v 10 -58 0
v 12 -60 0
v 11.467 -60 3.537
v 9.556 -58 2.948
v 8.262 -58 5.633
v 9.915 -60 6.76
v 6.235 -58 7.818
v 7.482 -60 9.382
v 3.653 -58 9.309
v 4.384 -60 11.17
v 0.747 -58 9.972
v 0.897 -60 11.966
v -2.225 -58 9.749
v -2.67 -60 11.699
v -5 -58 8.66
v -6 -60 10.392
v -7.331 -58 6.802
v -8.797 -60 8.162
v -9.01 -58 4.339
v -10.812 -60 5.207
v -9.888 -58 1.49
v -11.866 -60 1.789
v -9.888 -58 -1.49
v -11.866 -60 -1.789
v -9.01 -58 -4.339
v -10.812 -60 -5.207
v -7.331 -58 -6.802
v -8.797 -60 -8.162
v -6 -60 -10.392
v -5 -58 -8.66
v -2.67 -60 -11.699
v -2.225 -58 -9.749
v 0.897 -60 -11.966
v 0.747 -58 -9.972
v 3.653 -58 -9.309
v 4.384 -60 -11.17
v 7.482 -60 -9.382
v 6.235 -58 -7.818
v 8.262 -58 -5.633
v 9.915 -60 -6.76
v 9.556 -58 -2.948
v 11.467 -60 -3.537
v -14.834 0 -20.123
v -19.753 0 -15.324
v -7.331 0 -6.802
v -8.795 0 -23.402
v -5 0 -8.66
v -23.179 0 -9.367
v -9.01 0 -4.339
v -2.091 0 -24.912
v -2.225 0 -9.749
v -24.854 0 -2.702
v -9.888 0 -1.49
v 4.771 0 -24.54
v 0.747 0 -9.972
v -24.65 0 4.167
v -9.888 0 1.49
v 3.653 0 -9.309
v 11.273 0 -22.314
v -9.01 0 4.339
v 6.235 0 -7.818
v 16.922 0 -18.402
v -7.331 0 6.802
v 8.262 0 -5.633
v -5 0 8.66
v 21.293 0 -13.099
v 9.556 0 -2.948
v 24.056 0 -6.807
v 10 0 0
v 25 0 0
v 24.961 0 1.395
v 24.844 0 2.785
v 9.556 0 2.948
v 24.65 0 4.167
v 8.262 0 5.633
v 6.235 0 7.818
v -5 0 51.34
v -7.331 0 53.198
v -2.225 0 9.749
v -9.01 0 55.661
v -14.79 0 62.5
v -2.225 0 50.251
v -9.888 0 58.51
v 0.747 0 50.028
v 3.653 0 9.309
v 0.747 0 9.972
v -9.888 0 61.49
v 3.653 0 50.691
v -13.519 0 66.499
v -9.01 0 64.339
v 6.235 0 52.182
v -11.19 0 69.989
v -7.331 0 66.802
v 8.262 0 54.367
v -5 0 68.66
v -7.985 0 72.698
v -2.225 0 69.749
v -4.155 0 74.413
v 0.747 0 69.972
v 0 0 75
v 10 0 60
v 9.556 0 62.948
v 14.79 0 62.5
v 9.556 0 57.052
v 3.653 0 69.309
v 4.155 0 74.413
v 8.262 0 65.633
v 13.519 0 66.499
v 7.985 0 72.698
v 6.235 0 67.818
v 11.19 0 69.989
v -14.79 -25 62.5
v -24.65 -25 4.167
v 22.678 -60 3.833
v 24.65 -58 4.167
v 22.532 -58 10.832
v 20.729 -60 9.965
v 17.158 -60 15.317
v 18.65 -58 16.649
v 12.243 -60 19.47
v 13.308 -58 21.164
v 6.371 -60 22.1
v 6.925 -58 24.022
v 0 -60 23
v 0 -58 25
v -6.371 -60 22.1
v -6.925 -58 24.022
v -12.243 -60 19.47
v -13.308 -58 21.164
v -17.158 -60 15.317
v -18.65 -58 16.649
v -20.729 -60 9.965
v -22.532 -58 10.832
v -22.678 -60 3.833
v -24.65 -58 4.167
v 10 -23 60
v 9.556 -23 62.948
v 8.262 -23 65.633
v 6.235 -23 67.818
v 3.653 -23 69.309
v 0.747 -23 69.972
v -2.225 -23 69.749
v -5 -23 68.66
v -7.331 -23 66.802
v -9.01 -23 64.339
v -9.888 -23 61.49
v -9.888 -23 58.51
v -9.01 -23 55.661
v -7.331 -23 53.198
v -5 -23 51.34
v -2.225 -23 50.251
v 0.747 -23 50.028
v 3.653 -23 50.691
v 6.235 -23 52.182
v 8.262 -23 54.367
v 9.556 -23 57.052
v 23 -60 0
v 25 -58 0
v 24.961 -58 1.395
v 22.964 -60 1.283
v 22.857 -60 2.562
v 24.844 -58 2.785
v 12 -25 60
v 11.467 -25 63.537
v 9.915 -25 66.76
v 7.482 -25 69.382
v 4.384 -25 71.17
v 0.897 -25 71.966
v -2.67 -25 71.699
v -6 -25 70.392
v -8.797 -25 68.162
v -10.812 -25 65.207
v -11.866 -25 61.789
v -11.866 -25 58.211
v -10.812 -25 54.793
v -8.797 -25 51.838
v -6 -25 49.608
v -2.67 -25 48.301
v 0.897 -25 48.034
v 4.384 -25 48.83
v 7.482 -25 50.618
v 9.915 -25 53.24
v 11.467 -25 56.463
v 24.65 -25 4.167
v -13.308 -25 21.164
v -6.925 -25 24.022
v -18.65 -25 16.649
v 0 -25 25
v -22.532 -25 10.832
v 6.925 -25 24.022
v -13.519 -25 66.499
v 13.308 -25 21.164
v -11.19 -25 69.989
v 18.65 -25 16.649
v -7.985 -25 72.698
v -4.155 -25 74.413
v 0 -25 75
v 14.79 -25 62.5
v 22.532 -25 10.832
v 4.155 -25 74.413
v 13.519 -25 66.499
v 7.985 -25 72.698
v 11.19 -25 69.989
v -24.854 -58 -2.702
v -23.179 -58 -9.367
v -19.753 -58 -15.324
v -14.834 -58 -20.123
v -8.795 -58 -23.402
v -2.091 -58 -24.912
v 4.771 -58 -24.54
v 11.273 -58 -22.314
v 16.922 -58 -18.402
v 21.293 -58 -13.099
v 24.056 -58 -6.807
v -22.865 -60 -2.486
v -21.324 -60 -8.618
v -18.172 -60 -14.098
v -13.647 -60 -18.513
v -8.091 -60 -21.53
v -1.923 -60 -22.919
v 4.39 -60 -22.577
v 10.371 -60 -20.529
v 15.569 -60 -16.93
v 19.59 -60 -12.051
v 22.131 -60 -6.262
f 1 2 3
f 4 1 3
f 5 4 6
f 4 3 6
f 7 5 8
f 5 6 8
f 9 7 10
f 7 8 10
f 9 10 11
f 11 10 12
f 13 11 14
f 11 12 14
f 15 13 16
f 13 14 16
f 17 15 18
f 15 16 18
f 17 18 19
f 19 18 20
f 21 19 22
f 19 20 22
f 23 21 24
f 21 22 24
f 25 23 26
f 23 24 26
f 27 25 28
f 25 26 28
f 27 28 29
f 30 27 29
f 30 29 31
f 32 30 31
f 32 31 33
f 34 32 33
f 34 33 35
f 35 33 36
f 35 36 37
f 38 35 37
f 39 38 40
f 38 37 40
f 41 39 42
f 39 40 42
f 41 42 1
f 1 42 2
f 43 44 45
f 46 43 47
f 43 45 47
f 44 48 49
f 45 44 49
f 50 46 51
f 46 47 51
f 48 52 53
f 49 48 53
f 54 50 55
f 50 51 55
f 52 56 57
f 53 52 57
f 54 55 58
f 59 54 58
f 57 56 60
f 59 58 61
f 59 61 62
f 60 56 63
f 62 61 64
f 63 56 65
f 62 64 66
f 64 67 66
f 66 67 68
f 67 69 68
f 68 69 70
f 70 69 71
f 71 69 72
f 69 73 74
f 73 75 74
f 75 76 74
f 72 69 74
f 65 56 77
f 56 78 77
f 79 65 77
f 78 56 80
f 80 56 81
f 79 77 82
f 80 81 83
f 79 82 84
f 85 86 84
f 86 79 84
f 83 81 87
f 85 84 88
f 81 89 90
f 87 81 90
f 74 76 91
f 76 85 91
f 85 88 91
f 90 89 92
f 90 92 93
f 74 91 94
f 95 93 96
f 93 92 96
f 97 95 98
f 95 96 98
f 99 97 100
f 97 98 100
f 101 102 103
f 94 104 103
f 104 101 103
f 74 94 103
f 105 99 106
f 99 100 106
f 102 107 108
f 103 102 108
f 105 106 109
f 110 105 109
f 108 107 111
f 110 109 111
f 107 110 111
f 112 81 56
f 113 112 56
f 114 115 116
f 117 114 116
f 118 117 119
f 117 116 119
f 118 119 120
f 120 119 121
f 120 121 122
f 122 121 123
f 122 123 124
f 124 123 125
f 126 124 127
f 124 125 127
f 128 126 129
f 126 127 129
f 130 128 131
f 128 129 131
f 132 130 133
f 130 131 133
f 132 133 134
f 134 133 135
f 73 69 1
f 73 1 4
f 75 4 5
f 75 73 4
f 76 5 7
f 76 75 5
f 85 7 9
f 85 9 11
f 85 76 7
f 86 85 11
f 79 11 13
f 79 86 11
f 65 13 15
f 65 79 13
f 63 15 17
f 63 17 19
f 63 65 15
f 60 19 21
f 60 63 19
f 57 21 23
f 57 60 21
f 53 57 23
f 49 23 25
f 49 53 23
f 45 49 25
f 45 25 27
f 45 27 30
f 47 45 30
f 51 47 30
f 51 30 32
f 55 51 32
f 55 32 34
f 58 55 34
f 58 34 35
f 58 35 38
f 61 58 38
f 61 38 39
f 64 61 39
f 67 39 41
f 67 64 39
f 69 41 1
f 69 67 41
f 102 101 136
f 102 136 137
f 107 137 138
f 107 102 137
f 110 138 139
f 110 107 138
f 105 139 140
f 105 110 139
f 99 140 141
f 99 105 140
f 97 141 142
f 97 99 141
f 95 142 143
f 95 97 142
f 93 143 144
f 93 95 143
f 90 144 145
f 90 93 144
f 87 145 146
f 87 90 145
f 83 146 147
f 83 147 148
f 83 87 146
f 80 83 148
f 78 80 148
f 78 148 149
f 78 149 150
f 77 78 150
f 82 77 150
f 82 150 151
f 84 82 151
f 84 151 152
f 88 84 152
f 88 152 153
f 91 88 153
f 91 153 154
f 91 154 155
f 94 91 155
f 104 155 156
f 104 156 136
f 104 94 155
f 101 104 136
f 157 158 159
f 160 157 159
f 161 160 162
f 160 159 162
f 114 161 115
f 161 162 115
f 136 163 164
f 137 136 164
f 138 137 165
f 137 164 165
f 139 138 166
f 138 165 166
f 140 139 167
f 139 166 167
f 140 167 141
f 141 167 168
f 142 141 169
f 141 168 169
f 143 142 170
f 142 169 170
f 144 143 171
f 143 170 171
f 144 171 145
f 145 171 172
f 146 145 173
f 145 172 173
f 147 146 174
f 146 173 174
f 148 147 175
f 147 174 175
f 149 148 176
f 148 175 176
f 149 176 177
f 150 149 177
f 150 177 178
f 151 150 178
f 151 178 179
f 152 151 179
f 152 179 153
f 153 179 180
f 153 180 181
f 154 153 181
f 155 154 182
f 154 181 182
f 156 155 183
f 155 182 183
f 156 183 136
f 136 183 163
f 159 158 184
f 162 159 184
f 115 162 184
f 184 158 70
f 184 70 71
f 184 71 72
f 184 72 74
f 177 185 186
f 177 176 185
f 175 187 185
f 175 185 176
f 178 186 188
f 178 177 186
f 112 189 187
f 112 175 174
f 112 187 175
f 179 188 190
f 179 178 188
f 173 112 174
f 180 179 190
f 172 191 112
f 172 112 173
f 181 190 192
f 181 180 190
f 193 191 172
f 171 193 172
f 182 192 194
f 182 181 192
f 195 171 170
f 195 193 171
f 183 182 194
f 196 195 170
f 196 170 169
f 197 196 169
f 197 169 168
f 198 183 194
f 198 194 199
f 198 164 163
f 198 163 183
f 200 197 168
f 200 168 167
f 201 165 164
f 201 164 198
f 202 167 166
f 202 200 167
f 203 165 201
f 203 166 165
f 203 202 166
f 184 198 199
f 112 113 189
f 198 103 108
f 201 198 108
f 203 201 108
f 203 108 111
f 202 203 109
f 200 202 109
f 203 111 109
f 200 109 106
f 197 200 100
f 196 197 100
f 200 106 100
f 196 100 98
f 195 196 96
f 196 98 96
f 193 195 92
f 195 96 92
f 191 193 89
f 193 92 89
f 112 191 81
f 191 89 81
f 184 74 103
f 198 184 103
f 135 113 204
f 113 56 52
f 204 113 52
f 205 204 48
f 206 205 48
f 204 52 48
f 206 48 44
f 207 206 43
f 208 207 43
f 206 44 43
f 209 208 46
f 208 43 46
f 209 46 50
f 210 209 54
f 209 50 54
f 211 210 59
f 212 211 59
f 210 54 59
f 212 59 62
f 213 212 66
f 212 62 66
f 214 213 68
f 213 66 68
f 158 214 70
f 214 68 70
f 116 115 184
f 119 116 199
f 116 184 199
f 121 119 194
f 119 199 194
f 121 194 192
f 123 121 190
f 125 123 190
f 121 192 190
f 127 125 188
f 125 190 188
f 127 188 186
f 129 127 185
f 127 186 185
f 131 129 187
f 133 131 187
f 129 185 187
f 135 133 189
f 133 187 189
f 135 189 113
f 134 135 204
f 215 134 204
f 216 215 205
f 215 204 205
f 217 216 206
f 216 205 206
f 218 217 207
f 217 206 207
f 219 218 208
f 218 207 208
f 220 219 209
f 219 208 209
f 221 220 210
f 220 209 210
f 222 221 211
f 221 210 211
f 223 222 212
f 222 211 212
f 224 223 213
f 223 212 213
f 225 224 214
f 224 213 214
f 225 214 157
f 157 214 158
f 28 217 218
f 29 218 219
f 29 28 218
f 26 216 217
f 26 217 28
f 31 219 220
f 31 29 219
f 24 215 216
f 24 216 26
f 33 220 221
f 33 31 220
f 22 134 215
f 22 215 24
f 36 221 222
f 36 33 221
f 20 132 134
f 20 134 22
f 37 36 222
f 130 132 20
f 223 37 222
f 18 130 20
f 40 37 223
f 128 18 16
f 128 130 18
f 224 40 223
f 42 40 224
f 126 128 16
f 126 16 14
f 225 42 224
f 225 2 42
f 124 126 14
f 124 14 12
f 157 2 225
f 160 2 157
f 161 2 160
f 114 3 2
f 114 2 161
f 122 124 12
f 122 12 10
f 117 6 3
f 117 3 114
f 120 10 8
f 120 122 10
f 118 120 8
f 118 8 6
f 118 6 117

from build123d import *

# Parameters (mm, degrees)
F0_R     = 10
F1_DEPTH = 25
F2_DEPTH = 60
F3_SIZE  = 2


with BuildPart() as f1:
    # F0 (on Front) → F1 (new body)
    with BuildSketch(Plane.XZ):
        with BuildLine():
            ThreePointArc((-14.790199, 62.5), (-1.254394, 45.052542), (15, 60))
            ThreePointArc((15, 60), (14.947458, 61.254394), (14.790199, 62.5))
            ThreePointArc((14.790199, 62.5), (0, 75), (-14.790199, 62.5))
        make_face()
        with Locations((0, 60)):
            Circle(F0_R, mode=Mode.SUBTRACT)
        with BuildLine():
            ThreePointArc((14.790199, 62.5), (14.947458, 61.254394), (15, 60))
            ThreePointArc((15, 60), (-1.254394, 45.052542), (-14.790199, 62.5))
            Line((-14.790199, 62.5), (-24.650332, 4.166667))
            ThreePointArc((-24.650332, 4.166667), (0, 25), (24.650332, 4.166667))
            Line((24.650332, 4.166667), (14.790199, 62.5))
        make_face()
        with BuildLine():
            ThreePointArc((25, 0), (24.91243, 2.090657), (24.650332, 4.166667))
            ThreePointArc((24.650332, 4.166667), (0, 25), (-24.650332, 4.166667))
            ThreePointArc((-24.650332, 4.166667), (-2.090657, -24.91243), (25, 0))
        make_face()
        Circle(F0_R, mode=Mode.SUBTRACT)
    extrude(amount=F1_DEPTH)

    # F0 (on Front) → F2 (join)
    with BuildSketch(Plane.XZ):
        with BuildLine():
            ThreePointArc((25, 0), (24.91243, 2.090657), (24.650332, 4.166667))
            ThreePointArc((24.650332, 4.166667), (0, 25), (-24.650332, 4.166667))
            ThreePointArc((-24.650332, 4.166667), (-2.090657, -24.91243), (25, 0))
        make_face()
        Circle(F0_R, mode=Mode.SUBTRACT)
    extrude(amount=F2_DEPTH)

    # F3
    f3_edges = [f1.edges().sort_by_distance(p)[0] for p in [
        (-25, -60, 0),
        (-10, -60, 0),
        (-10, -25, 60),
    ]]
    chamfer(f3_edges, length=F3_SIZE)


solid = f1.part
